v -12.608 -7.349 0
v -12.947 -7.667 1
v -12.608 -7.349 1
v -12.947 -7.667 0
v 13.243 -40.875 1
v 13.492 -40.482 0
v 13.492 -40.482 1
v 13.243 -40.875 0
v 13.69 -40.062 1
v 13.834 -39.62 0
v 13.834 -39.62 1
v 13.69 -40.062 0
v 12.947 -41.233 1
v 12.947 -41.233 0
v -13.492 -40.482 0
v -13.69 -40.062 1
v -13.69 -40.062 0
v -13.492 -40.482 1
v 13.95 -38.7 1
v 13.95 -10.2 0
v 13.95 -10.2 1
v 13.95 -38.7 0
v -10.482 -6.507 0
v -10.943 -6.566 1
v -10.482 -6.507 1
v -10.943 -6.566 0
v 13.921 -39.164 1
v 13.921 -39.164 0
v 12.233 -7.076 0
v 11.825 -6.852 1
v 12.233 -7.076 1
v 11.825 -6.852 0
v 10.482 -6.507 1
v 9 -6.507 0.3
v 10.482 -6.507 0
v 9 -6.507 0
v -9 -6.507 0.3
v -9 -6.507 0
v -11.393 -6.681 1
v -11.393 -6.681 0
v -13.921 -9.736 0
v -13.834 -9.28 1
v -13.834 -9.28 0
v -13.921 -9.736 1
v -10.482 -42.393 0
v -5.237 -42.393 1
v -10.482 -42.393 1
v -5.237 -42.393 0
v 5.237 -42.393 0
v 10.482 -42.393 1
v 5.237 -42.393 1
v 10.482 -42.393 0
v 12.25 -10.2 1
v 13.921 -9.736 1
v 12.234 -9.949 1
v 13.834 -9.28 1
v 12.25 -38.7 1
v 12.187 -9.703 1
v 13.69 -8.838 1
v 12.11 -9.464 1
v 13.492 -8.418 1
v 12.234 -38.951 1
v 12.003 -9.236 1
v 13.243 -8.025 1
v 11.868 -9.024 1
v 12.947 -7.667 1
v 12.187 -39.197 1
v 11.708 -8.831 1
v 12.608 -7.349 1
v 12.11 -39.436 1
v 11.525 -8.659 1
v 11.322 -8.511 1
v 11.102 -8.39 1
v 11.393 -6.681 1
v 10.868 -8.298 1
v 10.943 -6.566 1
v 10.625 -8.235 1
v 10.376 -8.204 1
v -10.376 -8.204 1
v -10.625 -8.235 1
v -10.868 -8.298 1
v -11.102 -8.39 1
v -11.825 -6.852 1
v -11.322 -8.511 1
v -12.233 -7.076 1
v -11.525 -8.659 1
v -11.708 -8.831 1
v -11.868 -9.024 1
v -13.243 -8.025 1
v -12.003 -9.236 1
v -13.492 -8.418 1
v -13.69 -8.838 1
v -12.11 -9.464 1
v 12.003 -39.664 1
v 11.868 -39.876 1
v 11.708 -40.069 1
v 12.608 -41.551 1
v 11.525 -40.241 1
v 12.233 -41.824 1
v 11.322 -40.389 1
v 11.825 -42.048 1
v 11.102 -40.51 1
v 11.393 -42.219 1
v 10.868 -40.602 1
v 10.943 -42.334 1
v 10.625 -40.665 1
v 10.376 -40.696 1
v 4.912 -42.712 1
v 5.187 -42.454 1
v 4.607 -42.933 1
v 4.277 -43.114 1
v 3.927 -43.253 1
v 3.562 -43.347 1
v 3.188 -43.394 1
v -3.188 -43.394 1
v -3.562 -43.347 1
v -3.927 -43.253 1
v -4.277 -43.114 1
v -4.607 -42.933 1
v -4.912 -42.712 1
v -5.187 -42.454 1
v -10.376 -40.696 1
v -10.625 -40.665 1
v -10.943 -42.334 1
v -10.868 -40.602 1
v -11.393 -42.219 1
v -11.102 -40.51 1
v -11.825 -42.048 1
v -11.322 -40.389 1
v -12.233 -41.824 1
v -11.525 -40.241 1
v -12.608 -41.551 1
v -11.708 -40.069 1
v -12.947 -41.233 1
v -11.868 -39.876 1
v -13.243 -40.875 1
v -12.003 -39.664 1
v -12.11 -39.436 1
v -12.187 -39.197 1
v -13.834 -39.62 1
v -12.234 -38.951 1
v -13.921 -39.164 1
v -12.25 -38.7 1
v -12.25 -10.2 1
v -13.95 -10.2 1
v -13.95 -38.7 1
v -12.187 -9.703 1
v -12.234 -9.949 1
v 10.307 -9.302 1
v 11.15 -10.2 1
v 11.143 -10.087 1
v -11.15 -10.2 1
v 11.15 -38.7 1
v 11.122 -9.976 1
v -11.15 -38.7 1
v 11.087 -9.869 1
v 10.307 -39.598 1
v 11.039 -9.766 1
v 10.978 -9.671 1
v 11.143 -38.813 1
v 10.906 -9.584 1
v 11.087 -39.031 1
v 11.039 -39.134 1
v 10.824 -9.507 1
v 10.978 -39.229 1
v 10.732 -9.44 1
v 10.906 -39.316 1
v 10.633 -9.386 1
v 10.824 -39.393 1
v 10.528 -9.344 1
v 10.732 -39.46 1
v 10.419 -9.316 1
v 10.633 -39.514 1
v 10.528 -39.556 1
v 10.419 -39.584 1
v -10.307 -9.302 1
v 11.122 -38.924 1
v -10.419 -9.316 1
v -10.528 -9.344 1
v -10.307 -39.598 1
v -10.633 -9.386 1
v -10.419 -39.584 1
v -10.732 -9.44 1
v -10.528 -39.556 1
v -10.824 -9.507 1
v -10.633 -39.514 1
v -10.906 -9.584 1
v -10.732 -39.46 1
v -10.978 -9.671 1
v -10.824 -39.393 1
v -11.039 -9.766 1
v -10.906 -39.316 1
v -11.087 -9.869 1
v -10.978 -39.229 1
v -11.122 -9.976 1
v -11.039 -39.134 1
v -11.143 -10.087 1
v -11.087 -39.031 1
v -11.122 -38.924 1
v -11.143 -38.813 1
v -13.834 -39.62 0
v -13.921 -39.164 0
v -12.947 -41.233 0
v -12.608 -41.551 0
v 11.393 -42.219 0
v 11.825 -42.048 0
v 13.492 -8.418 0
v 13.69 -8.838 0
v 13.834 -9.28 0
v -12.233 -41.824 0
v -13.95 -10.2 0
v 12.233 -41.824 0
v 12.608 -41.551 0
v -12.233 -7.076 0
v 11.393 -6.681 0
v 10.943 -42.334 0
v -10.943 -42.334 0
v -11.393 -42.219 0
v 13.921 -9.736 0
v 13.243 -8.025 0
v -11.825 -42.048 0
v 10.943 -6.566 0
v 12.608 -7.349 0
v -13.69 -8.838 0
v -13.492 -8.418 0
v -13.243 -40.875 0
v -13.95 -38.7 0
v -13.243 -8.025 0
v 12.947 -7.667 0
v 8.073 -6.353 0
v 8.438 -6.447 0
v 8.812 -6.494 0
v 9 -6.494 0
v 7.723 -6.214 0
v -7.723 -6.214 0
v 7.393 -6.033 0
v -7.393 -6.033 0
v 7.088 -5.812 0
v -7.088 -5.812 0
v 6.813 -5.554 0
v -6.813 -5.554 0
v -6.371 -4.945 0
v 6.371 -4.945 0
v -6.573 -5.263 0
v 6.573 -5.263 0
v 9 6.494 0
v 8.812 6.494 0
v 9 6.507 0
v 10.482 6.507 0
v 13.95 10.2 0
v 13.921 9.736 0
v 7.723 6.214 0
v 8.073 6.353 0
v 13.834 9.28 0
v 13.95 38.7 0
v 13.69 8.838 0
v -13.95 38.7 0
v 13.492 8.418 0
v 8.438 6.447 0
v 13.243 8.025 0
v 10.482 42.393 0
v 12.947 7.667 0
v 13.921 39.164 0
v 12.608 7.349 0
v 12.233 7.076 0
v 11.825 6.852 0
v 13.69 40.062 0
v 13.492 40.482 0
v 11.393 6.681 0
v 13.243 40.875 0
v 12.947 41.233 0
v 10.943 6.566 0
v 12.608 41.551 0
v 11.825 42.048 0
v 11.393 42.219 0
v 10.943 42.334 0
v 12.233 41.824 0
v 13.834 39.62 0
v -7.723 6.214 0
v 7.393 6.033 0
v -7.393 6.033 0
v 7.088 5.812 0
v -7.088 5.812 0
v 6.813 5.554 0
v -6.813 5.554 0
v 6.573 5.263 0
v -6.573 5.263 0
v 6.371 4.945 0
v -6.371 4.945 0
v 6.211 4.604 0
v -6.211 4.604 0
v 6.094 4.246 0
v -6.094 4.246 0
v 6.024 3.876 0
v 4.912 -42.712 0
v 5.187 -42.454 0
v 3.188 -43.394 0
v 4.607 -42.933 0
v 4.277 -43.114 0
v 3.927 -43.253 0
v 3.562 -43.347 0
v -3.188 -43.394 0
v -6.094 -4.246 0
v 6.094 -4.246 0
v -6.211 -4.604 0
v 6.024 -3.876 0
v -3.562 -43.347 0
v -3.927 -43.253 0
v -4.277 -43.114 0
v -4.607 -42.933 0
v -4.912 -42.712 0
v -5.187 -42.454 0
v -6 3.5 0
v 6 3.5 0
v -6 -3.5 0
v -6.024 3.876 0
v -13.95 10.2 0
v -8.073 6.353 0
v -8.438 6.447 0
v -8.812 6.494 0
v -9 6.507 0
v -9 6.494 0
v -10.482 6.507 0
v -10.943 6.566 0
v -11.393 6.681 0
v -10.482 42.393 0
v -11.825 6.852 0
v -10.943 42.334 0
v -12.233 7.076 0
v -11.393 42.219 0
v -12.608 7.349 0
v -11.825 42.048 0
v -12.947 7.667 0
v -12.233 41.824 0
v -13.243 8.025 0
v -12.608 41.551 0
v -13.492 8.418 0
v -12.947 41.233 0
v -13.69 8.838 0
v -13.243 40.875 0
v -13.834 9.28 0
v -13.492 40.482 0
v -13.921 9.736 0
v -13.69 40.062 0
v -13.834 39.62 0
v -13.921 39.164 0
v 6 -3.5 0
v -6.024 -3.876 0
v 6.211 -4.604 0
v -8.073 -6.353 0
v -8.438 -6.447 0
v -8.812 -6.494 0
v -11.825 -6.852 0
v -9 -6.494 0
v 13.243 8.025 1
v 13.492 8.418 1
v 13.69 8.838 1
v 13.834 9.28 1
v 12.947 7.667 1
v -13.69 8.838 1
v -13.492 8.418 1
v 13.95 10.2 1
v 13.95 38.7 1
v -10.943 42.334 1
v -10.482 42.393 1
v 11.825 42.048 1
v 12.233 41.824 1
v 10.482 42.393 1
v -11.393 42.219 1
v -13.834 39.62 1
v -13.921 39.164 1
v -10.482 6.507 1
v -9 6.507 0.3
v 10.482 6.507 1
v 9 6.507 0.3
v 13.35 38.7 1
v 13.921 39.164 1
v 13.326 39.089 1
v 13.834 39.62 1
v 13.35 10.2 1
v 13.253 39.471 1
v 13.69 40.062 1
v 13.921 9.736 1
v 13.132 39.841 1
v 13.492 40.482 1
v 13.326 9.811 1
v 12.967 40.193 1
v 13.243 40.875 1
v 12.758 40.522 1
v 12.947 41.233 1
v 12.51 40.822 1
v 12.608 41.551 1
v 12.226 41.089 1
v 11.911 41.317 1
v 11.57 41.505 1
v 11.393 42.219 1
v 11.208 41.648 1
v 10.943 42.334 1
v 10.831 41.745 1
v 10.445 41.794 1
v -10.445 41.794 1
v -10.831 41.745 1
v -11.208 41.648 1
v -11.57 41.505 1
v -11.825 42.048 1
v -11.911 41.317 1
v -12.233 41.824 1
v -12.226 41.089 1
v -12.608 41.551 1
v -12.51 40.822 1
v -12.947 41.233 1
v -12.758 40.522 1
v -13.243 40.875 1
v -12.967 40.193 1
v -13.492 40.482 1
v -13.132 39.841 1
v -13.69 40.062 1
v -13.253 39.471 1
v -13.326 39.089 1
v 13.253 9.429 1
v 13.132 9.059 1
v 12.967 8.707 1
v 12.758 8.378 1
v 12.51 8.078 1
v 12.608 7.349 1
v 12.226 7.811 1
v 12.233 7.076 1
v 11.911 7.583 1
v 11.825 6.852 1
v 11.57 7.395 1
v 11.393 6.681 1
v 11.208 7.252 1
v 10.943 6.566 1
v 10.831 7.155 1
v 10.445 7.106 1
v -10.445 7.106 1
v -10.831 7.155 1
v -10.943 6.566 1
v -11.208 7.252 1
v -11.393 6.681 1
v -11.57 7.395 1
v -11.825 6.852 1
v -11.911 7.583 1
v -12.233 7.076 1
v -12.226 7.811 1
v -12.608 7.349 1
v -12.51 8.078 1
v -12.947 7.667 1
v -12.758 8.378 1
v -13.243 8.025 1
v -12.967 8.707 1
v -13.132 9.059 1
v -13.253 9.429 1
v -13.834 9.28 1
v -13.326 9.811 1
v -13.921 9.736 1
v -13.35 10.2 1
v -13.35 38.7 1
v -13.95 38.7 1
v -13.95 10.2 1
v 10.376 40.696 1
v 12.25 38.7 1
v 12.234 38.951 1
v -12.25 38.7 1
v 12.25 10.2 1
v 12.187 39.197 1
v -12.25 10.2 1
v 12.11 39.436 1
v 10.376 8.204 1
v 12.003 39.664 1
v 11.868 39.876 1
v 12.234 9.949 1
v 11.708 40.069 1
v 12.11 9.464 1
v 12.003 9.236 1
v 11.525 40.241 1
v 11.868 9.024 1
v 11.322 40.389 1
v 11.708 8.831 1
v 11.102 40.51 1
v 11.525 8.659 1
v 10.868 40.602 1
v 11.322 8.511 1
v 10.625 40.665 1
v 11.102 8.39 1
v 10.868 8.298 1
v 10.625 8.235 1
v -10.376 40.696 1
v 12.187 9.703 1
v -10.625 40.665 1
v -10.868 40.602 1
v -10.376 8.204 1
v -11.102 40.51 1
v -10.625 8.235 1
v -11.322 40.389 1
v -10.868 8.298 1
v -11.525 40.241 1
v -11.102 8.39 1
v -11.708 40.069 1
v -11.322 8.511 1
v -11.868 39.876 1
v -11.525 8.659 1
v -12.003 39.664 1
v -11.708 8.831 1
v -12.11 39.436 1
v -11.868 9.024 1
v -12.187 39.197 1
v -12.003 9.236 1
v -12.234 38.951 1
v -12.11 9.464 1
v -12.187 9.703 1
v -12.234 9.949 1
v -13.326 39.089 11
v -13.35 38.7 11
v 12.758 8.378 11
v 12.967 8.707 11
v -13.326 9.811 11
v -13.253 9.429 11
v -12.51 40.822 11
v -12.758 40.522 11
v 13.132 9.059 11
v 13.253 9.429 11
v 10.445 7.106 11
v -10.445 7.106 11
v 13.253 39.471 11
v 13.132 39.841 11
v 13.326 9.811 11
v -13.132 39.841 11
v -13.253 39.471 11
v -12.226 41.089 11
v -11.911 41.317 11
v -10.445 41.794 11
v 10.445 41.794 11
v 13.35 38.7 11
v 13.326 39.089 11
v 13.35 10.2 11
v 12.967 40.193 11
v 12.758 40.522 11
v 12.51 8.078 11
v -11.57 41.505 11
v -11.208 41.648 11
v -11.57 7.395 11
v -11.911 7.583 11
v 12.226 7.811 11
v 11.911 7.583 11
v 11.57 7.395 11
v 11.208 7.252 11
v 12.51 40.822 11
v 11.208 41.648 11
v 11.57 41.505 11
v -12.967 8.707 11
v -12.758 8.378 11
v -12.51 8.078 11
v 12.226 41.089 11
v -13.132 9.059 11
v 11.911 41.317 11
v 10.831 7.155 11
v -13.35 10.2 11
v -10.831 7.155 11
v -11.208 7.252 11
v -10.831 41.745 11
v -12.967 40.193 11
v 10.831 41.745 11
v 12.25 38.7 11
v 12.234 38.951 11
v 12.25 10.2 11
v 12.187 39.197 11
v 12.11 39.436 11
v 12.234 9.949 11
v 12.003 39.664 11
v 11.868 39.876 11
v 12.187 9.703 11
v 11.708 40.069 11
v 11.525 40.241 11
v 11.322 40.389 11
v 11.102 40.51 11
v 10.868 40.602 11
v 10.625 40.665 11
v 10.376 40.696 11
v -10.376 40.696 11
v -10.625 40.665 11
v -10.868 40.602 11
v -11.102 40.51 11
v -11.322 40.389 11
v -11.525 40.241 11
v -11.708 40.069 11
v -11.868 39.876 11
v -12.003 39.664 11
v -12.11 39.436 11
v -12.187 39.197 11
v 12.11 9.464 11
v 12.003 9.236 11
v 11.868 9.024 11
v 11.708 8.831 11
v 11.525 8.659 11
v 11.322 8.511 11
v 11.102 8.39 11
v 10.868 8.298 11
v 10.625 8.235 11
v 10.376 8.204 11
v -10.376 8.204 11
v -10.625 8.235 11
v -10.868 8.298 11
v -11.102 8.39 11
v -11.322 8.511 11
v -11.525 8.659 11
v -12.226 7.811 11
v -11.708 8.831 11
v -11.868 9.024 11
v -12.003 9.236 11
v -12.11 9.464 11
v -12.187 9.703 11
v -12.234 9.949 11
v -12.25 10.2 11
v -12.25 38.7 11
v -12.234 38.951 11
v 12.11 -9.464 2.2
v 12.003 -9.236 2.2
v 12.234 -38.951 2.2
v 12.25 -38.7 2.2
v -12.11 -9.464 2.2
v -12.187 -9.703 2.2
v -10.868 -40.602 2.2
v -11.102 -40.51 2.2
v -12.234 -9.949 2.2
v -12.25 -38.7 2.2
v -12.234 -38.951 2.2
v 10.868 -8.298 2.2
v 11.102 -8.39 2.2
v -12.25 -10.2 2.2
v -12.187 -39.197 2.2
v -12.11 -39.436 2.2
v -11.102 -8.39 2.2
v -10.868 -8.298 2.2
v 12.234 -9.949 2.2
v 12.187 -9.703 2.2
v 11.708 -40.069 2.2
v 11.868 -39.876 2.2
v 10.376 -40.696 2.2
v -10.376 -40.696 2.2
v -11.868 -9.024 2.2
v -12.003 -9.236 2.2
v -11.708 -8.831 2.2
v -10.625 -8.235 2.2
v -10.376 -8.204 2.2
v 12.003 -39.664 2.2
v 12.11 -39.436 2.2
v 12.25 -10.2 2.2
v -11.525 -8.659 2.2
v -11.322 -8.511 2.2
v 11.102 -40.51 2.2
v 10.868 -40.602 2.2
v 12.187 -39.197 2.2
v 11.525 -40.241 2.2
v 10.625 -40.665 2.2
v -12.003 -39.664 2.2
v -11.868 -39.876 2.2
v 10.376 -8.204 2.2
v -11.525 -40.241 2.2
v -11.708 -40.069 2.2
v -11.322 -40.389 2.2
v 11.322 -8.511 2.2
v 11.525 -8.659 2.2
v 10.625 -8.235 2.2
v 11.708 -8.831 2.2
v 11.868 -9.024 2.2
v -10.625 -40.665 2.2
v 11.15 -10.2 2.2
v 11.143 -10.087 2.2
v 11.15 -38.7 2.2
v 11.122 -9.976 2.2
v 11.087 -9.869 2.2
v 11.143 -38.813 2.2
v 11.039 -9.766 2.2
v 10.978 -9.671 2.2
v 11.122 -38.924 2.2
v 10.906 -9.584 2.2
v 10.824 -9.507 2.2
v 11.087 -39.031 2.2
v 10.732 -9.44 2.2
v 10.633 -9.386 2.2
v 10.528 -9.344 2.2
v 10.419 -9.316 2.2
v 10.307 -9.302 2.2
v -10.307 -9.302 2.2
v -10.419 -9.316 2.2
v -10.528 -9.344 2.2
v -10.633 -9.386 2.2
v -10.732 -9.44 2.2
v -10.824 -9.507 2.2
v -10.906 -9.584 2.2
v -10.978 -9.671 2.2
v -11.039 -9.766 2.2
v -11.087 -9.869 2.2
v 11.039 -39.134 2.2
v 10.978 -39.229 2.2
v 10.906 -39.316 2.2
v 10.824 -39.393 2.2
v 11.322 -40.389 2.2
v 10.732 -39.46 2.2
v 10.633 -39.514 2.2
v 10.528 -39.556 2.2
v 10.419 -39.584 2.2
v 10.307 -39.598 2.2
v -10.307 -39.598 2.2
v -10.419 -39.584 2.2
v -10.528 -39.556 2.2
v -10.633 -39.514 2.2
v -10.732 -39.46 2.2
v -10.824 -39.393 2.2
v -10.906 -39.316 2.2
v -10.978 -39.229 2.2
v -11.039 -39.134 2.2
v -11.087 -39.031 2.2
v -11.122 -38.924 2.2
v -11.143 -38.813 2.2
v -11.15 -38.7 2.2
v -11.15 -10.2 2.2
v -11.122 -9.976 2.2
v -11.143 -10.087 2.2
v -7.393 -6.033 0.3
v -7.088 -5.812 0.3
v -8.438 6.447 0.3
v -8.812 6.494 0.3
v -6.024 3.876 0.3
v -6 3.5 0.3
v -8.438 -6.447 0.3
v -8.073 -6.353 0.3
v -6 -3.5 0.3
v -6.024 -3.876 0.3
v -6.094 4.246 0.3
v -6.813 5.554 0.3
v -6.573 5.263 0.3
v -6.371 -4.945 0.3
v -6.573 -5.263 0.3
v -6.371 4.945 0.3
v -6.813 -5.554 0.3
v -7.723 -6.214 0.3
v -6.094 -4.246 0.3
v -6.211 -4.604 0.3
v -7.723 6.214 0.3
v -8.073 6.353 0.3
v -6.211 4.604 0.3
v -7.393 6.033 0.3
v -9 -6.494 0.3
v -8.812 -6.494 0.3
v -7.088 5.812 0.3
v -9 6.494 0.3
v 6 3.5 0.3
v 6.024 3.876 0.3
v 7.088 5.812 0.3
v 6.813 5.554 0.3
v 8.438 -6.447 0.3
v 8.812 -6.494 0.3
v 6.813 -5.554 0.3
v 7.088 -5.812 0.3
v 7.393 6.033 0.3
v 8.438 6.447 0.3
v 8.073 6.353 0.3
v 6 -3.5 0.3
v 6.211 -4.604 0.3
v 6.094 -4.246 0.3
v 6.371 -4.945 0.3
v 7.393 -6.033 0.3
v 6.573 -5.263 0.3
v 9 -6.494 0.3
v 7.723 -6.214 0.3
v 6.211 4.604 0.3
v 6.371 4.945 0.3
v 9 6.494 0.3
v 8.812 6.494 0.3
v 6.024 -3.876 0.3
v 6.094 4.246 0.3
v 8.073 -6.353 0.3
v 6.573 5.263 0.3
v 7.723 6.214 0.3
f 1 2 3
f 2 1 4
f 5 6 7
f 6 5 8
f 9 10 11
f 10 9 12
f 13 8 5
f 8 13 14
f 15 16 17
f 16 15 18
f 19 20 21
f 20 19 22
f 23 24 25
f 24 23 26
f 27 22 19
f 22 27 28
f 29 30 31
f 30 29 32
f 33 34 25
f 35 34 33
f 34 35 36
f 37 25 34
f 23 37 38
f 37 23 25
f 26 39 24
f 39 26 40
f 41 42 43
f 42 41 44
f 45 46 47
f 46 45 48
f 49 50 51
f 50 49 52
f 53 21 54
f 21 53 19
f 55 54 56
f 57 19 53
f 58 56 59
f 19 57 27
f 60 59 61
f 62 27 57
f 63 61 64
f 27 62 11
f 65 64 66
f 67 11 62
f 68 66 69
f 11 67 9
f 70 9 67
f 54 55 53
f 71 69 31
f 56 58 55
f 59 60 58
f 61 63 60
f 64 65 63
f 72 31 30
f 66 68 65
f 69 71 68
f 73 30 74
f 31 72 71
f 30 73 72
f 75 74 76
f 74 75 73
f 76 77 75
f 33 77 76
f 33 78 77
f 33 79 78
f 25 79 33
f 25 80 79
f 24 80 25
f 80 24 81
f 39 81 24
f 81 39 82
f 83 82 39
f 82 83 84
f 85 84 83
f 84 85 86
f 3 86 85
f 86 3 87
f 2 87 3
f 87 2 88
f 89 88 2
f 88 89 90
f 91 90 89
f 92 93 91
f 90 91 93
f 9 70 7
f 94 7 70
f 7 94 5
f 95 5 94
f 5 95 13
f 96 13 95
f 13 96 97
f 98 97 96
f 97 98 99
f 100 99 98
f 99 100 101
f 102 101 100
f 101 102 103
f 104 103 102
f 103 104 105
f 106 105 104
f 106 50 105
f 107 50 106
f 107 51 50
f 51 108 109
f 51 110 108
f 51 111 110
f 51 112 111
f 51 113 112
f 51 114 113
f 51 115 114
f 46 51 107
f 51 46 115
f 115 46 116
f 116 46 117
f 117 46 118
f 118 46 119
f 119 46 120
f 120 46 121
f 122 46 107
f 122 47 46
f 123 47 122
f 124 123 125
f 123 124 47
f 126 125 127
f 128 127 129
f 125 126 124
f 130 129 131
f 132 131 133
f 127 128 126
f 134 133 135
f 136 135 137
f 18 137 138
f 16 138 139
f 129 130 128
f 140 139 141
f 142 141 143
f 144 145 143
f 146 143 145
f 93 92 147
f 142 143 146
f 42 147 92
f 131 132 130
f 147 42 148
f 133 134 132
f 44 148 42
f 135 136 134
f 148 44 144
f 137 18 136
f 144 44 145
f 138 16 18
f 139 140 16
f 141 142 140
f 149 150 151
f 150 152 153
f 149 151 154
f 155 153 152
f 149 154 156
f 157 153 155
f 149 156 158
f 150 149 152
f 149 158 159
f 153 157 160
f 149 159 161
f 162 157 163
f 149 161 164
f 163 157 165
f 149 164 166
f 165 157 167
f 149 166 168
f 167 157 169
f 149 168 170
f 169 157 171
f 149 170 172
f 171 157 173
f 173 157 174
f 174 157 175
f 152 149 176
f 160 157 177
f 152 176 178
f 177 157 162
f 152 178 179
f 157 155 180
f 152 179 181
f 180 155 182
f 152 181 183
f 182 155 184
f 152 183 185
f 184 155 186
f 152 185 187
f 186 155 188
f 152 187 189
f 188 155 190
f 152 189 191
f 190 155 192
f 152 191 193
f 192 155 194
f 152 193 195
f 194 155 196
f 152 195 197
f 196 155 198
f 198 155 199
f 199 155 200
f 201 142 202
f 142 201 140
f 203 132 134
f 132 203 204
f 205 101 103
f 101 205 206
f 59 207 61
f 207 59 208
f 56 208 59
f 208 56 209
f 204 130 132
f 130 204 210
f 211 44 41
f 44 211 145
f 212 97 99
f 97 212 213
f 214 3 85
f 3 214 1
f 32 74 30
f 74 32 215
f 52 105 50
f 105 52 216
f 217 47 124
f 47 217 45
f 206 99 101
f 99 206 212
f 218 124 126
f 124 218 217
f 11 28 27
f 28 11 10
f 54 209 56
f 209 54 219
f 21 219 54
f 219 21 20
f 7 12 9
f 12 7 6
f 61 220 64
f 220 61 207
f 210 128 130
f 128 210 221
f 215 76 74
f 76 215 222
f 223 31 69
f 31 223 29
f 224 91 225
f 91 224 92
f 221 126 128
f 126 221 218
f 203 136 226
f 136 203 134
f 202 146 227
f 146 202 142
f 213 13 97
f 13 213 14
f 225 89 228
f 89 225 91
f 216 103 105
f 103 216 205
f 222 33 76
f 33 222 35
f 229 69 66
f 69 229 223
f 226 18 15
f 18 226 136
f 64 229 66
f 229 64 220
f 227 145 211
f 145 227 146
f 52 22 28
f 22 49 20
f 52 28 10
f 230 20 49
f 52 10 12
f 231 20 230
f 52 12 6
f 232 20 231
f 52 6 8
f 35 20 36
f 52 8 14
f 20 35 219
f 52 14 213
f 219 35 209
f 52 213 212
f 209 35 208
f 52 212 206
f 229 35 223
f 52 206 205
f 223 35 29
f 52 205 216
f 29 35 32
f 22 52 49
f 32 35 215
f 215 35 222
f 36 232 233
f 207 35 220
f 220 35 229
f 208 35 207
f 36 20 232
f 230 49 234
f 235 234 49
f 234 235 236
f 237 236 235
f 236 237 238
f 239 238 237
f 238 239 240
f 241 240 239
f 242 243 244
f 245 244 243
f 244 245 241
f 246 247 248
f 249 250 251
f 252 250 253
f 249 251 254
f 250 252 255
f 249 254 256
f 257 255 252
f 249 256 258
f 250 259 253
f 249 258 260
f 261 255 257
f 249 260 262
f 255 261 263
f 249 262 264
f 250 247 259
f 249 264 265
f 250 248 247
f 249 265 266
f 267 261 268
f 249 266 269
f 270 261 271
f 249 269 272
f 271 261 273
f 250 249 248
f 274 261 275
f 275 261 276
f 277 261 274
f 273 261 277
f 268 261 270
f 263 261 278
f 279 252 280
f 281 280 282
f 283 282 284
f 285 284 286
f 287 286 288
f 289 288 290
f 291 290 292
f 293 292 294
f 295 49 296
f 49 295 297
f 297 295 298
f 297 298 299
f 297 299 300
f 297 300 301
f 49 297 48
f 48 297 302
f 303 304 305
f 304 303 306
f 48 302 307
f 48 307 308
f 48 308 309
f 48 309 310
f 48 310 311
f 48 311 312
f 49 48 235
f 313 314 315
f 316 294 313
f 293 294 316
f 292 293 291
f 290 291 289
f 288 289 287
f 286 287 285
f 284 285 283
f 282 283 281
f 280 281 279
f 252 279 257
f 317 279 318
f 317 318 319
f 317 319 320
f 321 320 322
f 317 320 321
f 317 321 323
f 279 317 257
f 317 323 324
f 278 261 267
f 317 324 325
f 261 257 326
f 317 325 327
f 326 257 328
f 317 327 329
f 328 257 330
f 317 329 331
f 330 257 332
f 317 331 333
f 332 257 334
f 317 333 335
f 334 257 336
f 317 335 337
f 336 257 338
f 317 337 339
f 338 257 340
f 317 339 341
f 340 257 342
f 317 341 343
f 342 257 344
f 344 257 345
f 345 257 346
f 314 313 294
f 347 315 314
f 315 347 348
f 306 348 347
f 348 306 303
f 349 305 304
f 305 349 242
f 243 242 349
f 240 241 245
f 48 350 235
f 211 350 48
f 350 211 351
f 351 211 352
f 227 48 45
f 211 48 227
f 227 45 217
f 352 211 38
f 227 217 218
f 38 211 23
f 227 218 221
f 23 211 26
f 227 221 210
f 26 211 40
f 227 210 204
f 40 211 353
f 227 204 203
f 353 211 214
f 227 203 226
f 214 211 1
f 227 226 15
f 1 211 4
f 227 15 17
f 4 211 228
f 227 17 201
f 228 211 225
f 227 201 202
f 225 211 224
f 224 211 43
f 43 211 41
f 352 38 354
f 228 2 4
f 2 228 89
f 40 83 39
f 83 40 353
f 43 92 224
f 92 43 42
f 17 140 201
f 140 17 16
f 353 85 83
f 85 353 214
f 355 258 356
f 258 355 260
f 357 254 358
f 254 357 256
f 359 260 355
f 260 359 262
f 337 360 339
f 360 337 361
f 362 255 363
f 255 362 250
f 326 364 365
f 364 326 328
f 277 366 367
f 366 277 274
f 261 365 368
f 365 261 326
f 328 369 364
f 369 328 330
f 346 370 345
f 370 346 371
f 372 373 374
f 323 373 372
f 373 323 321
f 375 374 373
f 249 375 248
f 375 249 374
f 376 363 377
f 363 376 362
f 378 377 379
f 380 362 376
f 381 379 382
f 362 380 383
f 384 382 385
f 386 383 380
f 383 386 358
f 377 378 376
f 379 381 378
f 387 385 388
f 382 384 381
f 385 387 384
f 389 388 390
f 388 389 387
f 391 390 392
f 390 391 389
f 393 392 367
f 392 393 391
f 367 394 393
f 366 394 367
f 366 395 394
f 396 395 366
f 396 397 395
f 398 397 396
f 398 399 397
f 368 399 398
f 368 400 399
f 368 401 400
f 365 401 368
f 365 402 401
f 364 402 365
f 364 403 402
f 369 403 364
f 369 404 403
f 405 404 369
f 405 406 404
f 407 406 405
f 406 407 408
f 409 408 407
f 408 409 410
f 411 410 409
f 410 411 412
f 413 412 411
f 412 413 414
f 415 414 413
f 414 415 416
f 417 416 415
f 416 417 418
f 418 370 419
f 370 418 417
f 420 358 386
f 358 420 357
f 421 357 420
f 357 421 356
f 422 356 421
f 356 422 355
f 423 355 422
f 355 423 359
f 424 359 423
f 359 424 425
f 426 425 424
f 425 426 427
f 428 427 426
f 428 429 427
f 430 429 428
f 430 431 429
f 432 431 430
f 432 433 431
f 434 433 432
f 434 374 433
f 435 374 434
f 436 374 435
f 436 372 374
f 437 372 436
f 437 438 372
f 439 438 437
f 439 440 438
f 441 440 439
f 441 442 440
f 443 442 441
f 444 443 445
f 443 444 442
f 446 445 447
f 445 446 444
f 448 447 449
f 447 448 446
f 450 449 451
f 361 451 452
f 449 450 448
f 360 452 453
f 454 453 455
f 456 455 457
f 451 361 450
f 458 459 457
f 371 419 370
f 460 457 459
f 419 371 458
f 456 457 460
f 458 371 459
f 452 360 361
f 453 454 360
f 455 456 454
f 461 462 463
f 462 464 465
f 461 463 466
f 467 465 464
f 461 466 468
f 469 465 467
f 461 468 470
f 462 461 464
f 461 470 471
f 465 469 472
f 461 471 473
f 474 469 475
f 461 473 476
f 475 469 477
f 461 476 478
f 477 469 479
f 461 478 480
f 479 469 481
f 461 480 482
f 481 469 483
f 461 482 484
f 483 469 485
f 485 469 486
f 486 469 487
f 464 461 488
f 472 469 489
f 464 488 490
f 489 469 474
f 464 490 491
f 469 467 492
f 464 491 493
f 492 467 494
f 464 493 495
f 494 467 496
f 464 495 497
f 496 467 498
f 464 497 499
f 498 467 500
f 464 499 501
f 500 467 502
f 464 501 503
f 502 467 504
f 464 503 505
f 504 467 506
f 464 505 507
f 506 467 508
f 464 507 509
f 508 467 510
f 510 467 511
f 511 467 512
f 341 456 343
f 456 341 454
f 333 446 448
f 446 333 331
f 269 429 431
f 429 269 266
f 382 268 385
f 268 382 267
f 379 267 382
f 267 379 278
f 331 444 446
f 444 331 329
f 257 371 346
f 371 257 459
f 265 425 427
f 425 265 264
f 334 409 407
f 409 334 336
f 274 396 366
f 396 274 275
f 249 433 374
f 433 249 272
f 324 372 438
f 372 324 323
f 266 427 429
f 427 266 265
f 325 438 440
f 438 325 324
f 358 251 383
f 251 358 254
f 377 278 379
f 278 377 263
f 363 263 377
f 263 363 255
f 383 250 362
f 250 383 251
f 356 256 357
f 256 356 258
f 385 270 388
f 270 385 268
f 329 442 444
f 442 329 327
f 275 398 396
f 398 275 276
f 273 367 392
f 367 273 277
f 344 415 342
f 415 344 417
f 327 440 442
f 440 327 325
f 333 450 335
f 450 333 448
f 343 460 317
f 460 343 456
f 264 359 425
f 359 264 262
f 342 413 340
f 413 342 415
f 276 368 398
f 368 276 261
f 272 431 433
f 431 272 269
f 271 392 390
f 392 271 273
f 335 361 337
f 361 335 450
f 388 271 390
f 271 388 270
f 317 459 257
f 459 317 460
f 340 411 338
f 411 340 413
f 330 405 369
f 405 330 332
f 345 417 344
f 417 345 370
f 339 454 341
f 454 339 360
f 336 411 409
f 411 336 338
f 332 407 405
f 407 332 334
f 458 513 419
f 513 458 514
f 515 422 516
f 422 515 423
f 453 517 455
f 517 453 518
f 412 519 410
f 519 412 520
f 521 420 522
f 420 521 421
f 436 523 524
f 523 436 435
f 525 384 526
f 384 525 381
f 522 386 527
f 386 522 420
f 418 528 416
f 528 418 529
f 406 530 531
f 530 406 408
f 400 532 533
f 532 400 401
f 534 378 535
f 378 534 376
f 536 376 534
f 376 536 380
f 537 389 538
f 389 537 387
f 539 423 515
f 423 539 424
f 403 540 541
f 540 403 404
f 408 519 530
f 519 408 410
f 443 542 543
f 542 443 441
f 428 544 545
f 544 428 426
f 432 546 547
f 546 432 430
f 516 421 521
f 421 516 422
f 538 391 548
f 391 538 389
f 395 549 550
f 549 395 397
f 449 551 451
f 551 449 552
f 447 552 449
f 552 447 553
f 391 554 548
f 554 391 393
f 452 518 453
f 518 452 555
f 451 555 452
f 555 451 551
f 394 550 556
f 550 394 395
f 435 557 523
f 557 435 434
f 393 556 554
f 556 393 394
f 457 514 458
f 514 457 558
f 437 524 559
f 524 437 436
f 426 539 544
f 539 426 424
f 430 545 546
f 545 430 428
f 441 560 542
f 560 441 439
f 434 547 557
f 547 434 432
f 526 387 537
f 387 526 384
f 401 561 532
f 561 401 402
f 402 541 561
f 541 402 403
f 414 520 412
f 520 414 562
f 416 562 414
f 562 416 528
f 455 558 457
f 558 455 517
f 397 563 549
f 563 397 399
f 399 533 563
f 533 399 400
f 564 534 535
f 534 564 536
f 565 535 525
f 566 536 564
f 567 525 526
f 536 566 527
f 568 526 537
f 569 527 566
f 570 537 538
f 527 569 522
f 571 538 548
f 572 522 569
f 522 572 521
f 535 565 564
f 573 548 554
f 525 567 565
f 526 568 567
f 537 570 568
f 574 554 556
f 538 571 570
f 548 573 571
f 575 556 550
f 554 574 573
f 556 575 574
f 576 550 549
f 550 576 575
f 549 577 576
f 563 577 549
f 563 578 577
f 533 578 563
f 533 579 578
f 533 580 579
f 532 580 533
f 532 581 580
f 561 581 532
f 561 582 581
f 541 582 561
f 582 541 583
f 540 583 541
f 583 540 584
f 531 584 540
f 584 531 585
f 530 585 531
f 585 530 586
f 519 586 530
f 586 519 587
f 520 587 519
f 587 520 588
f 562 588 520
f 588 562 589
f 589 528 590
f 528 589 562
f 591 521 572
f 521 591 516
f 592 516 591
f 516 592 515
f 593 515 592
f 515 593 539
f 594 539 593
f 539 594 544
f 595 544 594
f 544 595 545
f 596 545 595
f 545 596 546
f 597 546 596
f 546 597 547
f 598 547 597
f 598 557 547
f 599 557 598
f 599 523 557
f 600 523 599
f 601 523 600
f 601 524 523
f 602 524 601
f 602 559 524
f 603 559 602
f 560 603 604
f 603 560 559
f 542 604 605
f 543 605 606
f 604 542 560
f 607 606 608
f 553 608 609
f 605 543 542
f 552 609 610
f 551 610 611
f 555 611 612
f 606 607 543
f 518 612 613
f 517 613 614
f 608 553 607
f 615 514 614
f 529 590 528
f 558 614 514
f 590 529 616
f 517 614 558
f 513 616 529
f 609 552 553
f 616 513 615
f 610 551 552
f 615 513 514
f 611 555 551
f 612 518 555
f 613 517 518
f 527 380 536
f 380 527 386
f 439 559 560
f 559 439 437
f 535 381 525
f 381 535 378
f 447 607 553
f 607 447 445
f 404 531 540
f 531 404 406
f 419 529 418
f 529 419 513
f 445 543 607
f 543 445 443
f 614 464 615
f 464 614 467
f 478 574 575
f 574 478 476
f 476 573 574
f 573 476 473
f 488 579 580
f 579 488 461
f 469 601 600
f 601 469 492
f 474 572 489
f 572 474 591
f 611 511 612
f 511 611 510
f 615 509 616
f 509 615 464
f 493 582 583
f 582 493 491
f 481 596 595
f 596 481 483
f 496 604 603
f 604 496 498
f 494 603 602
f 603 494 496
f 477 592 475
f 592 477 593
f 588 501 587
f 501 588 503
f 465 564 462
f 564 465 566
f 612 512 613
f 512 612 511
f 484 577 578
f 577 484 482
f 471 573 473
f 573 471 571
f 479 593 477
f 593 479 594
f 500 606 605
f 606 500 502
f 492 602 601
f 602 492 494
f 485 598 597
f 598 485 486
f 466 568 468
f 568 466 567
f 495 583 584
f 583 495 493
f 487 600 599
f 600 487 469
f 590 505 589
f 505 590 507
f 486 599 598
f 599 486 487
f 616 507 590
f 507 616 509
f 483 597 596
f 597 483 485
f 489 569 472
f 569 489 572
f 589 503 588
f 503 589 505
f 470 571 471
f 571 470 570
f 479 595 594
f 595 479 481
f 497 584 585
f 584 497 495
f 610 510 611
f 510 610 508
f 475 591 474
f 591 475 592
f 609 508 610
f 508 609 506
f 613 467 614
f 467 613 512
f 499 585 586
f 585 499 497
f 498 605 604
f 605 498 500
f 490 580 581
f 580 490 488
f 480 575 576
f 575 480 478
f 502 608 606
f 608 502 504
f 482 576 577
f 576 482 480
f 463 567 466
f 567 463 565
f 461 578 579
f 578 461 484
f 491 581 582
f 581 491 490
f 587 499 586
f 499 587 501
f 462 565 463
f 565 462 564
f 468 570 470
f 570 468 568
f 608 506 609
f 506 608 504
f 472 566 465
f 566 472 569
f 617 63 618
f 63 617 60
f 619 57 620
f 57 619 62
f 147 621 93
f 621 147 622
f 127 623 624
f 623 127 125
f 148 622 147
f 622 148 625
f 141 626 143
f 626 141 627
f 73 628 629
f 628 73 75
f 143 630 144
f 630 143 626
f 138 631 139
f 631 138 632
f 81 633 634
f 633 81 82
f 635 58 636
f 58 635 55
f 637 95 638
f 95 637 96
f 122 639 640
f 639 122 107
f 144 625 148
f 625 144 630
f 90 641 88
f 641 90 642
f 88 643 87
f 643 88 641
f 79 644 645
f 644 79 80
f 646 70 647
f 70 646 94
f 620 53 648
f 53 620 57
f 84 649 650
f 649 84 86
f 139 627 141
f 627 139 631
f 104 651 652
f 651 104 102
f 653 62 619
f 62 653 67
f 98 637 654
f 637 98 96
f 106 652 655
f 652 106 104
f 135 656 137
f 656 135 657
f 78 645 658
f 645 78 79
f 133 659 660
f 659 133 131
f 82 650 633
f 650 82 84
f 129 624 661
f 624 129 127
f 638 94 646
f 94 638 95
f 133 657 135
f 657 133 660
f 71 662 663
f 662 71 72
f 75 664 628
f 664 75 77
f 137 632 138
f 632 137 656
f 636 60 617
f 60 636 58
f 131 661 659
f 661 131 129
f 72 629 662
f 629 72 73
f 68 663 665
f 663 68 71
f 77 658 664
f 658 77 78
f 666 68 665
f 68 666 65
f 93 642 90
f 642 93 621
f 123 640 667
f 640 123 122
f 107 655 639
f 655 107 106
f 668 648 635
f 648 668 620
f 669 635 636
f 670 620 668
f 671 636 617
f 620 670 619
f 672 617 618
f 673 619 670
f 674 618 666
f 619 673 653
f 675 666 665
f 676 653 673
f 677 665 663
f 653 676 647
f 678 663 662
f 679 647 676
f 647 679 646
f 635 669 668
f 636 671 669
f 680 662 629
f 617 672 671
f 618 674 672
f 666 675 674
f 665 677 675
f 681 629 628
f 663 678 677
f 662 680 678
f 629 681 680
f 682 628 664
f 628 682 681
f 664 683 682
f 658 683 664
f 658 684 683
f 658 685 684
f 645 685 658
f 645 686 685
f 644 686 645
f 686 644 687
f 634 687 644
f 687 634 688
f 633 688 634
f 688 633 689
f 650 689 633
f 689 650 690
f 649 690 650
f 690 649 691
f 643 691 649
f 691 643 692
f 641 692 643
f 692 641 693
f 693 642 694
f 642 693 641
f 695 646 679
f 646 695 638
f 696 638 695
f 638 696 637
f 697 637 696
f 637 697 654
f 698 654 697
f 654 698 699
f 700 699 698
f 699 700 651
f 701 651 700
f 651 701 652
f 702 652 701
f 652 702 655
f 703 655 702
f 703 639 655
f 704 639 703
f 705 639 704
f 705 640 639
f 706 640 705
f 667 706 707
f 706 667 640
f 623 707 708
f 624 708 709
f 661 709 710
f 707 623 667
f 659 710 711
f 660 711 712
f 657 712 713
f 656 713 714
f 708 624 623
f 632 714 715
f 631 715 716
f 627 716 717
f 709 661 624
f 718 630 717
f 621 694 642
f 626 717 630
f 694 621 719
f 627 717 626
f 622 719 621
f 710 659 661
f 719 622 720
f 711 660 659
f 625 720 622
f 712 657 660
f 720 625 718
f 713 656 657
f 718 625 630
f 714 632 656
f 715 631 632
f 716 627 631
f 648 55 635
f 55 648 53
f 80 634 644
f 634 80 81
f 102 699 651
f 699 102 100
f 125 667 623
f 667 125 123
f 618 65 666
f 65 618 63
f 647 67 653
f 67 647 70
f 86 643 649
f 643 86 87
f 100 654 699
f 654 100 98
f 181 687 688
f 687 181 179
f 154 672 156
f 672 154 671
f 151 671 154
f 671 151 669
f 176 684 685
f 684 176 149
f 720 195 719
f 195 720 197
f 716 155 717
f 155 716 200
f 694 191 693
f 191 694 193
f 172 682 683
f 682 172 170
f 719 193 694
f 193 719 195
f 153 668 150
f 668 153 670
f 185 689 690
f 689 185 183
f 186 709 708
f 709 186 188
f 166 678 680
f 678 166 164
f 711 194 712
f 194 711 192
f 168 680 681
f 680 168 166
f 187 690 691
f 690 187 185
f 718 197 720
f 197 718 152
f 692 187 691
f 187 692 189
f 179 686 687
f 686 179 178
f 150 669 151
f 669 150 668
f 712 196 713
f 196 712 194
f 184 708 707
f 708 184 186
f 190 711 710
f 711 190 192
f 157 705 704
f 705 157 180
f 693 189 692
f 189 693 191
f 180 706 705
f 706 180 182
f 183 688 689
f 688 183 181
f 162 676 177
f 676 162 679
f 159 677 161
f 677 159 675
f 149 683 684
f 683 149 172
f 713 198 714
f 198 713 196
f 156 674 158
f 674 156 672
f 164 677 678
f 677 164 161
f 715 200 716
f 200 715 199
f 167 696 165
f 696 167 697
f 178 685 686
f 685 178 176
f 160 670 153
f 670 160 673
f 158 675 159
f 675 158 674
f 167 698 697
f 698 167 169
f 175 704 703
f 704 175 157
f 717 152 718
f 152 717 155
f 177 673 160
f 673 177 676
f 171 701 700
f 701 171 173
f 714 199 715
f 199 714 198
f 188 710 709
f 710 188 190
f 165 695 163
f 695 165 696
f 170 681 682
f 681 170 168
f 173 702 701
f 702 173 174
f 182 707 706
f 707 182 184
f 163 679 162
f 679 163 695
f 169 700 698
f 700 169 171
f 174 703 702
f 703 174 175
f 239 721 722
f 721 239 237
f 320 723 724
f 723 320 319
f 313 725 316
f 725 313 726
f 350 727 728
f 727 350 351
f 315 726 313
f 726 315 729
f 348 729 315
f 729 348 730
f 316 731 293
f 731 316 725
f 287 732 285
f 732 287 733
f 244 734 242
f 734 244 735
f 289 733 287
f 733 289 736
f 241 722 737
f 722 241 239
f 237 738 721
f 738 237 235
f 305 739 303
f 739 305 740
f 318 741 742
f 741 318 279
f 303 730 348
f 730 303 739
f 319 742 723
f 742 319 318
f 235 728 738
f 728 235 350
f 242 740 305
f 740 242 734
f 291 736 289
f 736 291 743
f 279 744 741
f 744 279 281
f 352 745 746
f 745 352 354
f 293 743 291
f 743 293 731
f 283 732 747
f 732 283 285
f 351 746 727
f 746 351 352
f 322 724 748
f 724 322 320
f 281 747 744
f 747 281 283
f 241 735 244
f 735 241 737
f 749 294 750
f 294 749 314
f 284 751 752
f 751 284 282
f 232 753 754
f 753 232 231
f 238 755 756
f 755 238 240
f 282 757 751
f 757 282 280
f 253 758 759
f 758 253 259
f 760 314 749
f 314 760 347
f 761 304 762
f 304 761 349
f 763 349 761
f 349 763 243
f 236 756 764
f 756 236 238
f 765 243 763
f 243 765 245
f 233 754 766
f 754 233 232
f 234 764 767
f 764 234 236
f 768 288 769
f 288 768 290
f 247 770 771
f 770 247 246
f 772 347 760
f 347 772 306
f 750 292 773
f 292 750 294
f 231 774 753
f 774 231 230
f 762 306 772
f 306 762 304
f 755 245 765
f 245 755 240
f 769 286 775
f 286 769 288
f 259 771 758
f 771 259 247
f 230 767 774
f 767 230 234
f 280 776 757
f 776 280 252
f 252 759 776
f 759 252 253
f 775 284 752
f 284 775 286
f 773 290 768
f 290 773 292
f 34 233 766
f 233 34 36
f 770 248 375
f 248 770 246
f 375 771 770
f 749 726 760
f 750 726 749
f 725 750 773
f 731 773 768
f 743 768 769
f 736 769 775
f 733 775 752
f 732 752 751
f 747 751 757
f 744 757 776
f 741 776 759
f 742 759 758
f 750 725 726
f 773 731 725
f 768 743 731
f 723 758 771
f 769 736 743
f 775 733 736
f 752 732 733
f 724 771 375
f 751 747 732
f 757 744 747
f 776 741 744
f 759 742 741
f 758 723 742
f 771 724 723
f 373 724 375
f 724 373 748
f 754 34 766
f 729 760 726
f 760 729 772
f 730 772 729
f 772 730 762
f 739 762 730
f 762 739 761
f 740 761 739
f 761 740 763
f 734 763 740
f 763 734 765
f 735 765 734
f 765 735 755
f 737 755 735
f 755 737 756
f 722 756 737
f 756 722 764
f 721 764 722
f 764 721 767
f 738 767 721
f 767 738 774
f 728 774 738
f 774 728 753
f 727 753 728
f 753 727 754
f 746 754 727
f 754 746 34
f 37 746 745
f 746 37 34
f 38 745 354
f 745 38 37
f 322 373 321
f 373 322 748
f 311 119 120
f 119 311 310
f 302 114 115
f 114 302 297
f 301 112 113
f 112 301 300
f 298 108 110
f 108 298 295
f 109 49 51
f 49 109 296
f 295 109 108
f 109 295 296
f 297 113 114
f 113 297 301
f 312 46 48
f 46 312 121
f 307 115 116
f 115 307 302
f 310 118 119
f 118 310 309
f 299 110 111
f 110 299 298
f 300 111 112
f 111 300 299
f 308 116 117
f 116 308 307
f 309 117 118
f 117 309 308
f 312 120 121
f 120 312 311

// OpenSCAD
/*[Dimensions]*/

// Width of the case in mm (interior dimension)
interiorWidth = 24.5;

// Length of the case in mm (interior dimension)
interiorLength = 32.5;

// Height of the case in mm (interior dimension)
interiorHeight = 10;

// Case interior fillet radius
interiorFillet = 2.0;

// Width of the hinge in mm
hingeWidth = 12;


/*[Walls]*/

// Horizontal wall (top and bottom) thickness
coverThickness = 1.0; 

// Vertical wall (side) thickness 
sidewallWidth = 1.1; 

// Amount the lid protrudes into the case (larger value allows the case to close more securely)
lidInsetHeight = 1.2;

// Thickness of the hinge (it should be no more than a few layers thick keep it flexible)
hingeThickness = 0.3;

// hinge length multiplier (as a function of case height - longer hinges may be needed for less flexible plastics)
hingeLengthScale = 1.1;


/*[Details]*/

// Distance the top and bottom surfaces extend beyond the sides of the case (makes the case easier to open)
rimInset = 0.6; 

// Length of the opening tab on the lid of the case (optional - set to 0 to remove)
tabSize = 1; 

// Fillet radius used for hinge and tab
hingeFillet = 3;


/*[Printer Tolerances]*/

// Adjust the tightness of the closed case (larger value makes the case looser, negative value makes it tighter - try adjusting in 0.1mm increments)
lidInsetOffset = 0.0;



/*[hidden]*/
eps = 0.1;
$fn = 50; // resolution

module case()
{
	// minimal error checking
	hingeWidth = min(hingeWidth, interiorWidth);
	hingeThickness = min(hingeThickness, coverThickness);
	lidInsetHeight = min(lidInsetHeight, interiorHeight);

	baseLength = interiorLength + sidewallWidth*2;
	baseWidth = interiorWidth + sidewallWidth*2;
	baseRadius = interiorFillet + sidewallWidth;

	caseLength = baseLength + rimInset*2;
	caseWidth = baseWidth + rimInset*2;
	caseRadius = baseRadius + rimInset;

	hingeLength = hingeLengthScale * interiorHeight + coverThickness*2;
	centerY = (caseLength + hingeLength)/2;

	filletXOffset = hingeWidth/2 + hingeFillet;
	filletYOffset = hingeLength/2 - hingeFillet;


	module rrect(h, w, l, r) {
		r = min(r, min(w/2, l/2));
		w = max(w, eps);
		l = max(l, eps);
		h = max(h, eps);
		if (r <= 0) {
			translate([-w/2, -l/2,0]) {
				cube([w,l,h]);
			}
		} else {
			hull() {
				for (y = [-l/2+r, l/2-r]) {
					for (x = [-w/2+r, w/2-r]) {
						translate([x,y,0]) {
							cylinder(h=h, r=r, center=false);
						}
					}
				}
			}
		}
	}

	module rrectTube(h, ow, ol, or, t) {
		difference() {
			rrect(h=h, w=ow, l=ol, r=or);
			translate([0,0,-eps]) {
				rrect(h=h+eps*2, w=ow-t*2, l=ol-t*2, r=or-t);
			}
		}
	}

	union() {
		// bottom surfaces
		for (i = [-centerY, centerY]) {
			translate([0,i,0]) {
				rrect(h=coverThickness, w=caseWidth, l=caseLength, r=caseRadius);
			}
		}

		translate([0,0,coverThickness-eps]) {

			// base
			translate([0,centerY,0]) {
				rrectTube(h=interiorHeight+eps, ow=baseWidth, ol=baseLength, or=baseRadius, t=sidewallWidth);
			}

			// lid
			translate([0,-centerY,0]) {
				rrectTube(h=lidInsetHeight+eps, ow=interiorWidth - lidInsetOffset, ol=interiorLength - lidInsetOffset, or=interiorFillet - lidInsetOffset/2, t=sidewallWidth);
			}
		}

		// hinge
		if (hingeWidth > caseWidth - caseRadius*2) {
			translate([-hingeWidth/2,-centerY,0]) {
				cube([hingeWidth, centerY*2, hingeThickness]);
			}
		} else {
			difference() {
				translate([-hingeWidth/2 - hingeFillet,-centerY,0]) {
					cube([hingeWidth + hingeFillet*2, centerY*2, hingeThickness]);
				}
	
				// fillet hinge
				for (x = [-filletXOffset, filletXOffset]) {
					hull() {
						for (y = [-filletYOffset, filletYOffset]) {
							translate([x,y,-eps]) {
								cylinder(h=hingeThickness + eps*2, r=hingeFillet, center=false);
							}
						}
					}
				}
			}
		}

		// tab
		if (tabSize > 0) {
			hull() {
				for (x = [hingeFillet - hingeWidth/2, hingeWidth/2 - hingeFillet]) {
					translate([x,-caseLength - hingeLength/2 - tabSize + hingeFillet,0]) {
						cylinder(h=coverThickness, r=hingeFillet, center=false);
					}
				}
				translate([-hingeWidth/2,-centerY,0]) {
					cube([hingeWidth, eps, coverThickness]);
				}
			}
		}
	}	


}

case();
